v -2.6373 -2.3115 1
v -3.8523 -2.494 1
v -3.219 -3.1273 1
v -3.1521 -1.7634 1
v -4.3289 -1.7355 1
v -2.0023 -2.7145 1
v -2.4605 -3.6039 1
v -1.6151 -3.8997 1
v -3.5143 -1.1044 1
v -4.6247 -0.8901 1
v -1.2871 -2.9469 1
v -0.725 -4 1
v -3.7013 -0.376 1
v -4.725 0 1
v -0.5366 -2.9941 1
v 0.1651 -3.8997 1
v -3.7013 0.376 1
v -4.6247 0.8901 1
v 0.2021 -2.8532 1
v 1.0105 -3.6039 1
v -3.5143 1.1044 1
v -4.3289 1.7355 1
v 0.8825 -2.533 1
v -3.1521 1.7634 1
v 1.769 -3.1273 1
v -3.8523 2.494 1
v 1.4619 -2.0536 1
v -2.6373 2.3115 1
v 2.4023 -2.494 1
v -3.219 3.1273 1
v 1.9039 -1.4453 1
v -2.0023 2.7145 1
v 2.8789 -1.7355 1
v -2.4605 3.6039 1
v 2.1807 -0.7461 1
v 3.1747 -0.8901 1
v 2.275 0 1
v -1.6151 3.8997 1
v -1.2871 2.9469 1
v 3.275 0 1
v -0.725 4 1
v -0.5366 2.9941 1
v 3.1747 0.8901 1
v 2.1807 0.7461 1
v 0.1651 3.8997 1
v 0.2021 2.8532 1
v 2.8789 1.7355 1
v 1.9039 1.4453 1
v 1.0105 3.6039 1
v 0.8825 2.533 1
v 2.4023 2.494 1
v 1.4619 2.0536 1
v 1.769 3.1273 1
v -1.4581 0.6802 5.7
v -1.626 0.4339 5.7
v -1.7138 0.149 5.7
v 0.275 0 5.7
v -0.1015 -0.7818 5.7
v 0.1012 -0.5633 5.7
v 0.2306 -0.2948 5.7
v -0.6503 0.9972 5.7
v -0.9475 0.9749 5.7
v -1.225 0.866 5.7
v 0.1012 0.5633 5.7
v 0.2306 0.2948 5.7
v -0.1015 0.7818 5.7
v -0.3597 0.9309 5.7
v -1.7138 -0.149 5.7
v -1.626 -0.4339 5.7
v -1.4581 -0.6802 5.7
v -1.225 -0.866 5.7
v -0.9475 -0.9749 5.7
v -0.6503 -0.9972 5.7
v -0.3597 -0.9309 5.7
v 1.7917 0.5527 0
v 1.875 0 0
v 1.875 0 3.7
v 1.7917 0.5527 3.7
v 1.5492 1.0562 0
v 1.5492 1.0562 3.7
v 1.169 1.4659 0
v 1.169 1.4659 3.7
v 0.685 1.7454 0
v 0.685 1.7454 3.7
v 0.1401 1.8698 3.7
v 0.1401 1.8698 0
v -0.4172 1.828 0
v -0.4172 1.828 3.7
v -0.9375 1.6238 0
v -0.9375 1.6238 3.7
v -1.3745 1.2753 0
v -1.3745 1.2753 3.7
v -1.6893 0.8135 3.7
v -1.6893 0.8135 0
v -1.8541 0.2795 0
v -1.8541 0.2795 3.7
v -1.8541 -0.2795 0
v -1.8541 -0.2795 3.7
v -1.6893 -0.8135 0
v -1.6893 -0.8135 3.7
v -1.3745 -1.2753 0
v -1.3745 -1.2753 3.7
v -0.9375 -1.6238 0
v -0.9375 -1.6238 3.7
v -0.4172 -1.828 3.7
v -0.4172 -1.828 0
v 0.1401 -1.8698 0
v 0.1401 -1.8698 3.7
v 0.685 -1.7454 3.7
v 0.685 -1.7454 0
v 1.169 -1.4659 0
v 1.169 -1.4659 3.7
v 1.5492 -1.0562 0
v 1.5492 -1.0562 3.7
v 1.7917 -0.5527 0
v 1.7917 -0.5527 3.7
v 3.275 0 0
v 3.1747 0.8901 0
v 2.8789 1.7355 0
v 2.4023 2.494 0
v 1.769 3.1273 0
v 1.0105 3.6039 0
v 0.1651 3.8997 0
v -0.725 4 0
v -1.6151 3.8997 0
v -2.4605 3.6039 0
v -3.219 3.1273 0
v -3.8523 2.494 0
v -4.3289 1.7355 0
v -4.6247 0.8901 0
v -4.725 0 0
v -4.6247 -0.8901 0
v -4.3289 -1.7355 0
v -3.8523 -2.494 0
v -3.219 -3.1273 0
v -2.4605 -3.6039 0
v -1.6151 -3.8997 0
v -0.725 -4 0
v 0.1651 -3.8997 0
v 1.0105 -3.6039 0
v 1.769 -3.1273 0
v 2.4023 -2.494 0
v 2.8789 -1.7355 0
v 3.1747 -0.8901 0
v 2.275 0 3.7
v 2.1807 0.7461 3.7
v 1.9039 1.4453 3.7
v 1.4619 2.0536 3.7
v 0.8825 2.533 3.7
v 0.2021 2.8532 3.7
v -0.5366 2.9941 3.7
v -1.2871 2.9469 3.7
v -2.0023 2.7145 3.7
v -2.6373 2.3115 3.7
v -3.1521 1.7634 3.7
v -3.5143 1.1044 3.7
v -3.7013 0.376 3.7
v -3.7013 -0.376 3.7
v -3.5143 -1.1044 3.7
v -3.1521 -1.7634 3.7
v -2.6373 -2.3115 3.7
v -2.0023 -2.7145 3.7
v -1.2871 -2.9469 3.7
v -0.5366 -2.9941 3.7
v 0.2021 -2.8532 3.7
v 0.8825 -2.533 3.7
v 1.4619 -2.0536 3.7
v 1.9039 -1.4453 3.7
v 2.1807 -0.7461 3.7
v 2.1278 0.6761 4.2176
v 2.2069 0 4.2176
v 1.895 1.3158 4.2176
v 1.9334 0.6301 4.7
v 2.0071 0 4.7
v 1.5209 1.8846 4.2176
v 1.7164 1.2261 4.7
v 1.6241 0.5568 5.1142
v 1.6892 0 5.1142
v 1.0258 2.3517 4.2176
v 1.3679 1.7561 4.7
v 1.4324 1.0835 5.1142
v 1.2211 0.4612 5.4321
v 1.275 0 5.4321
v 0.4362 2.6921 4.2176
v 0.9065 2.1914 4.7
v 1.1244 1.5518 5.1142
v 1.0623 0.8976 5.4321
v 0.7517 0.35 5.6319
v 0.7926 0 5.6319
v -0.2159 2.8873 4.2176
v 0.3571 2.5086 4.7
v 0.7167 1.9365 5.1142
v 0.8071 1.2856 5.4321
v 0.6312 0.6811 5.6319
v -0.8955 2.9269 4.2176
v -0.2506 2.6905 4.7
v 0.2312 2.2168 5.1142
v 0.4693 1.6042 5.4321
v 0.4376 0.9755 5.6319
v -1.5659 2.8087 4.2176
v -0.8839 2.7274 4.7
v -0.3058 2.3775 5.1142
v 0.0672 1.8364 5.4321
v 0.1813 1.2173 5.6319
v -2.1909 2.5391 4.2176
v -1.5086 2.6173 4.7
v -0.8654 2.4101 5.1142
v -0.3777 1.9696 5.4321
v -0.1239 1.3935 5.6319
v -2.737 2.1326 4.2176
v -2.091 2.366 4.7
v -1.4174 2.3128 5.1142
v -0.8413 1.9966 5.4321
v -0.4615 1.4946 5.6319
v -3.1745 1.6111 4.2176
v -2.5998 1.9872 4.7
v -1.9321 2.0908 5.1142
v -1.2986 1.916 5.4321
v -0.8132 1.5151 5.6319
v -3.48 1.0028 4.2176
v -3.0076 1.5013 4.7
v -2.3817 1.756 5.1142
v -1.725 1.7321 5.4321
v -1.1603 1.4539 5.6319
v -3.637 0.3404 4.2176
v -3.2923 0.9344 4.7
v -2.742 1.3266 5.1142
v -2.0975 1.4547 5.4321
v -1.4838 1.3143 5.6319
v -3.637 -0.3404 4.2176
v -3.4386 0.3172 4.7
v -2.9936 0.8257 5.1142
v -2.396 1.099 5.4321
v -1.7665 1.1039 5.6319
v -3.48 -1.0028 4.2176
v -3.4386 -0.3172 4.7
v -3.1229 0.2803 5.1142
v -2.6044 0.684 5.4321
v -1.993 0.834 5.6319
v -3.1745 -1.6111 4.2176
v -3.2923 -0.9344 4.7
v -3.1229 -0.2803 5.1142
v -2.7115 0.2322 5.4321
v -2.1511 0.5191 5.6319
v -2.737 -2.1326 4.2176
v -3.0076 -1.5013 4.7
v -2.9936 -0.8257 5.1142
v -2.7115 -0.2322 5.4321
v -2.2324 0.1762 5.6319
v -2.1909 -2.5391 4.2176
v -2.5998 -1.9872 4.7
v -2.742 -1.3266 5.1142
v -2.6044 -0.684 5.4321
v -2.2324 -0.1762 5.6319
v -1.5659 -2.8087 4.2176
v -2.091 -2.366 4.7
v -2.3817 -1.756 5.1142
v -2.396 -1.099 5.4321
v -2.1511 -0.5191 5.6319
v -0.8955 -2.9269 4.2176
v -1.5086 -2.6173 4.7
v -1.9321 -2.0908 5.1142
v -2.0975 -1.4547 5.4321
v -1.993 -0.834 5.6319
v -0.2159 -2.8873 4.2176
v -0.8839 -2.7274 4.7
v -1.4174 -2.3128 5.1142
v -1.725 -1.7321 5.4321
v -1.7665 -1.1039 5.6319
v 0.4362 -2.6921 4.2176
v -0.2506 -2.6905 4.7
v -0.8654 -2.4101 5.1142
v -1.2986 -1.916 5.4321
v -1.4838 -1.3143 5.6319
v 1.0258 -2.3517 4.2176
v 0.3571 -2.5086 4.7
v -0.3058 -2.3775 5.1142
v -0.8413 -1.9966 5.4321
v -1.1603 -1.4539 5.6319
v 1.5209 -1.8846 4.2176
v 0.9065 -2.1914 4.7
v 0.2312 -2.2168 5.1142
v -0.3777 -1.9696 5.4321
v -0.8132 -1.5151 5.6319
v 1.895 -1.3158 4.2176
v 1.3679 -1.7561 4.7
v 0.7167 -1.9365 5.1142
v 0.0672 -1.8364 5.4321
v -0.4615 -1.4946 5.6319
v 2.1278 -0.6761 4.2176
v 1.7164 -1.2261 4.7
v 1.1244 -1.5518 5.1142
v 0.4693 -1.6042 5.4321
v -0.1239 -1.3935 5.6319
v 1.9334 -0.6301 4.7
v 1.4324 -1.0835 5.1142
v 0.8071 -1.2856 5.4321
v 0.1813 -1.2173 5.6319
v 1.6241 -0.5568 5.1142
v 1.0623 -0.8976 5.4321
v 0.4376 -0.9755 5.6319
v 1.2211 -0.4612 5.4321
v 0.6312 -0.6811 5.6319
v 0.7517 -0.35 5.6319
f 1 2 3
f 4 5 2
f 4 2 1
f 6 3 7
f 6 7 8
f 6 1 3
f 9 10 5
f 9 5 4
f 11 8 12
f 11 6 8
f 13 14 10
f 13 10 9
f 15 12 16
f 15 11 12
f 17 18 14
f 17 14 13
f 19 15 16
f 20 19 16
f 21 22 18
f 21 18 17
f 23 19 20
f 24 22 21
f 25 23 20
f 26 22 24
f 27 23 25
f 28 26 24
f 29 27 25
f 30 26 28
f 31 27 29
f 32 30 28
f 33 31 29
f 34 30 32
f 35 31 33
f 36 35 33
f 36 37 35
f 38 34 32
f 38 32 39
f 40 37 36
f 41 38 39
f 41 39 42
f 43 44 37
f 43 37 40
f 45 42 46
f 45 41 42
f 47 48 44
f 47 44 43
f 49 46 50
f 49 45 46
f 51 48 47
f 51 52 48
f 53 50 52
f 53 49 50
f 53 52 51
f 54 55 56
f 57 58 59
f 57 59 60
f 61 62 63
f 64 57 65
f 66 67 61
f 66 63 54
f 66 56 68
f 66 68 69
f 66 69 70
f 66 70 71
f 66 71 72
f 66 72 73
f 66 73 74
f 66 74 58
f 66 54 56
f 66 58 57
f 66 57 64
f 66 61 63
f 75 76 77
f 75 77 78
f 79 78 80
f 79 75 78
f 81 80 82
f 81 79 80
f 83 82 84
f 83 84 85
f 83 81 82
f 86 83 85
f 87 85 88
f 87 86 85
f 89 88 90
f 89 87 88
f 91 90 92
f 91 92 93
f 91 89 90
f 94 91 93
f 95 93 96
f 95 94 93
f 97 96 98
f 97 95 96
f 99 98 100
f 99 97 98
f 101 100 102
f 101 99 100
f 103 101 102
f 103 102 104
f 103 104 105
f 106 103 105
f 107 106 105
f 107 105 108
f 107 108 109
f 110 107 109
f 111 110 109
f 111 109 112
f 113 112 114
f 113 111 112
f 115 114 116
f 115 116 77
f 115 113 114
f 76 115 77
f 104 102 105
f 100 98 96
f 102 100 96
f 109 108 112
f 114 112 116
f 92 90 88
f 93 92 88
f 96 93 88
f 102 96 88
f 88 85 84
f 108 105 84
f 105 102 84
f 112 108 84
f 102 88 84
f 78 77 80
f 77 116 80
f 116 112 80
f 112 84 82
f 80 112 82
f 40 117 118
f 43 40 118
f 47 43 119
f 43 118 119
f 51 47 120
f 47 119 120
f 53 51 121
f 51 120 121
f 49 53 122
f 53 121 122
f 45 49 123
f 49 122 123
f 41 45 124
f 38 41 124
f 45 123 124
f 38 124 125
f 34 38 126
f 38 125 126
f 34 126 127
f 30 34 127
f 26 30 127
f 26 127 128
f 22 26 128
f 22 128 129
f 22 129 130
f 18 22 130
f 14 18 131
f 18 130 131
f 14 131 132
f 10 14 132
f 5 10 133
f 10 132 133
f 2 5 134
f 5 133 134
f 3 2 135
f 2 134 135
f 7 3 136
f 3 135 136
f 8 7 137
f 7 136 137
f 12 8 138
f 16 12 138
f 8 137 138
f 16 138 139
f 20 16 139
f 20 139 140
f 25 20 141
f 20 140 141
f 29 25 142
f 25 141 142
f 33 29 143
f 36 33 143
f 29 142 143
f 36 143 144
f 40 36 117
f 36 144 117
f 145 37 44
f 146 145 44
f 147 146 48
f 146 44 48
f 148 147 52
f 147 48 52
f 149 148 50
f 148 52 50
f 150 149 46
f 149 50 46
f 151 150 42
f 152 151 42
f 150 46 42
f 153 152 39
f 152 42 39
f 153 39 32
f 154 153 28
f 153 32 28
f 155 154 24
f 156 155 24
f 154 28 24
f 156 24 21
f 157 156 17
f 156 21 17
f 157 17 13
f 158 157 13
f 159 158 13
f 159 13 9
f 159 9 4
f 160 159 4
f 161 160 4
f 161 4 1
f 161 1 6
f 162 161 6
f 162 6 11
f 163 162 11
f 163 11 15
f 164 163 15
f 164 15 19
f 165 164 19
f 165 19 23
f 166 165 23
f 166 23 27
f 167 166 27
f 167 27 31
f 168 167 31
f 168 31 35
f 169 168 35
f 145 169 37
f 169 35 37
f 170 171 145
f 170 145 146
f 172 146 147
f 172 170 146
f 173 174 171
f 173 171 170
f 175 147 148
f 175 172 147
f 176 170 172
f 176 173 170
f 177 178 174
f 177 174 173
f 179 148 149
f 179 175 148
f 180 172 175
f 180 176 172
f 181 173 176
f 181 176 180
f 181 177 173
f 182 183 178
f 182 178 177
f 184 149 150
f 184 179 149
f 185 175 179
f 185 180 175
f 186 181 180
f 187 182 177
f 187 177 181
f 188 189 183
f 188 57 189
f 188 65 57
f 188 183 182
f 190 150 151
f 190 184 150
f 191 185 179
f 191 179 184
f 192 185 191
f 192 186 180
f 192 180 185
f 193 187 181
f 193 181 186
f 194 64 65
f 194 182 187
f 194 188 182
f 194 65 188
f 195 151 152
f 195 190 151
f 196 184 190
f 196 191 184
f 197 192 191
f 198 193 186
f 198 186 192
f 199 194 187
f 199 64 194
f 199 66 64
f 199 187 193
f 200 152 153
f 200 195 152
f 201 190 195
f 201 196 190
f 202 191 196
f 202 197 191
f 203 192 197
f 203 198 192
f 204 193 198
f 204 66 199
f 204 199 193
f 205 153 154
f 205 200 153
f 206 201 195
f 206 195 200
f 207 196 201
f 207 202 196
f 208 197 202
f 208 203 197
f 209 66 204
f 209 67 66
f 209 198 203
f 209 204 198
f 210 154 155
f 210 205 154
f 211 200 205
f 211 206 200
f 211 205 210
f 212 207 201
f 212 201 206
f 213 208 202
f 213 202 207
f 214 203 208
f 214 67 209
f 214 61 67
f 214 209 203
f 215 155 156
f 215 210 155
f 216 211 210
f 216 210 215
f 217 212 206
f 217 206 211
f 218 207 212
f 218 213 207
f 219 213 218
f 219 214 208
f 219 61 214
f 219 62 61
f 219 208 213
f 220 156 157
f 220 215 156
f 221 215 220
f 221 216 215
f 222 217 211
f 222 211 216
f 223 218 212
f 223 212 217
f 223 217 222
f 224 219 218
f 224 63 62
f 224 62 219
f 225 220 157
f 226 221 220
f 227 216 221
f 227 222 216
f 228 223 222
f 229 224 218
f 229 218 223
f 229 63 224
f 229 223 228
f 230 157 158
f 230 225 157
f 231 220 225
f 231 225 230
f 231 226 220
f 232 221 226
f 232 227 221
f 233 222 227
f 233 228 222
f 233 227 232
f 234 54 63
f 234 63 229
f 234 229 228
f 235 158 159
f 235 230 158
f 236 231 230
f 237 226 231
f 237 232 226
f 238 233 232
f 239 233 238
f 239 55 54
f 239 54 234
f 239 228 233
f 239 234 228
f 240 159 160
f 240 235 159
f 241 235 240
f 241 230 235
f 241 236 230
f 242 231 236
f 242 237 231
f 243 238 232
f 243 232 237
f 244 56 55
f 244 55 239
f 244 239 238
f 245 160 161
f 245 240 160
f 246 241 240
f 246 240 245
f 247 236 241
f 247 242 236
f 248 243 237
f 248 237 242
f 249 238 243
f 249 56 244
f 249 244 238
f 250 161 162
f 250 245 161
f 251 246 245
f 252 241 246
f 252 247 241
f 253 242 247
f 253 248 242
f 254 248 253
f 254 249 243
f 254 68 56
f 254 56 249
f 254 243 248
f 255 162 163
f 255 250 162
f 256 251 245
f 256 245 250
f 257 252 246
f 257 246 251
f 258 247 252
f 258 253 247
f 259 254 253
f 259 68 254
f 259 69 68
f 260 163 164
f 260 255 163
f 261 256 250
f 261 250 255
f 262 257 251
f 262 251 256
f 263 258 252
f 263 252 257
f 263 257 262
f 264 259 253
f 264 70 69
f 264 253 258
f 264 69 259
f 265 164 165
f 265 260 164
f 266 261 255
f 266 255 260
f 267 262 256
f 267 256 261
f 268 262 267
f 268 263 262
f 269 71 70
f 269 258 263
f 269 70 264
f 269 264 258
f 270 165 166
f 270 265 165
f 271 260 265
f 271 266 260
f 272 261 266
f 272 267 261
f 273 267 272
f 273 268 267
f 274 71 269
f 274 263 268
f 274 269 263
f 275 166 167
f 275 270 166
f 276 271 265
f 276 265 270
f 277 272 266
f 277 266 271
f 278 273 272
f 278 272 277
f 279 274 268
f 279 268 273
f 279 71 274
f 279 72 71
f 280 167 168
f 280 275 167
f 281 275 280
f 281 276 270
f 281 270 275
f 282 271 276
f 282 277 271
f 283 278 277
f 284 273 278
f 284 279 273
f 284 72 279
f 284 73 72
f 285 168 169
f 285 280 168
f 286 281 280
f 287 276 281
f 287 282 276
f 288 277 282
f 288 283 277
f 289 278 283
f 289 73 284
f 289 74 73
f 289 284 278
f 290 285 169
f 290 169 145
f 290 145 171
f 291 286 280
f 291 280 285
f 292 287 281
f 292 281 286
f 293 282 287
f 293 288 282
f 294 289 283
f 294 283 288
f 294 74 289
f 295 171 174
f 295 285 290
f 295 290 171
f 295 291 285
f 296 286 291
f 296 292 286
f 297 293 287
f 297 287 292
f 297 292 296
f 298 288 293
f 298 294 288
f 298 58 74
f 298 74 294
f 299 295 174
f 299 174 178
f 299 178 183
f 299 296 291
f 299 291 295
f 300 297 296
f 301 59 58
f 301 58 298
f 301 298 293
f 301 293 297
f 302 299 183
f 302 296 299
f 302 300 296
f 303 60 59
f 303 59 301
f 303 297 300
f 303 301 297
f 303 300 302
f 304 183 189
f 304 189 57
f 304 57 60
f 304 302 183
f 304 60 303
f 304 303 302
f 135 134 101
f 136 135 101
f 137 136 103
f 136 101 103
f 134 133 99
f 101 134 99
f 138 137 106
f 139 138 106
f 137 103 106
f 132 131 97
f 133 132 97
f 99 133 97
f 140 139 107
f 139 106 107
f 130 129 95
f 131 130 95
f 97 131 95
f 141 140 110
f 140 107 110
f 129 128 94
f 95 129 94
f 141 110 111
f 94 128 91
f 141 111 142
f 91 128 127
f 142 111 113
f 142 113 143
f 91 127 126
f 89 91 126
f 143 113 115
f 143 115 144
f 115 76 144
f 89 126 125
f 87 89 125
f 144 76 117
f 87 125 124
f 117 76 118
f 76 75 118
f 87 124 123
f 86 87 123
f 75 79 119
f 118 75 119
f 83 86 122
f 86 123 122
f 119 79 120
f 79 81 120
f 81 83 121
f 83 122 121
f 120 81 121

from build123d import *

# Parameters (mm, degrees)
F0_R     = 4
F0_R_2   = 3
F1_DEPTH = 1
F0_R_3   = 1.875
F2_DEPTH = 3.7
F3_R     = 3
F3_R_2   = 1.875
F4_DEPTH = 2
F5_R     = 2


with BuildPart() as f1:
    # F0 (on Top) → F1 (new body)
    with BuildSketch(Plane.XY):
        with Locations((-0.725, 0)):
            Circle(F0_R)
        with Locations((-0.725, 0)):
            Circle(F0_R_2, mode=Mode.SUBTRACT)
    extrude(amount=F1_DEPTH)

    # F0 (on Top) → F2 (join)
    with BuildSketch(Plane.XY):
        with Locations((-0.725, 0)):
            Circle(F0_R_2)
        Circle(F0_R_3, mode=Mode.SUBTRACT)
    extrude(amount=F2_DEPTH)

    # F3 (on face) → F4 (join)
    with BuildSketch(Plane.XY.offset(3.7)):
        with Locations((-0.725, 0)):
            Circle(F3_R)
        Circle(F3_R_2, mode=Mode.SUBTRACT)
        Circle(F3_R_2)
    extrude(amount=F4_DEPTH)

    # F5
    f5_edges = [f1.edges().sort_by_distance(p)[0] for p in [
        (-3.725, 0, 5.7),
    ]]
    fillet(f5_edges, radius=F5_R)


solid = f1.part
